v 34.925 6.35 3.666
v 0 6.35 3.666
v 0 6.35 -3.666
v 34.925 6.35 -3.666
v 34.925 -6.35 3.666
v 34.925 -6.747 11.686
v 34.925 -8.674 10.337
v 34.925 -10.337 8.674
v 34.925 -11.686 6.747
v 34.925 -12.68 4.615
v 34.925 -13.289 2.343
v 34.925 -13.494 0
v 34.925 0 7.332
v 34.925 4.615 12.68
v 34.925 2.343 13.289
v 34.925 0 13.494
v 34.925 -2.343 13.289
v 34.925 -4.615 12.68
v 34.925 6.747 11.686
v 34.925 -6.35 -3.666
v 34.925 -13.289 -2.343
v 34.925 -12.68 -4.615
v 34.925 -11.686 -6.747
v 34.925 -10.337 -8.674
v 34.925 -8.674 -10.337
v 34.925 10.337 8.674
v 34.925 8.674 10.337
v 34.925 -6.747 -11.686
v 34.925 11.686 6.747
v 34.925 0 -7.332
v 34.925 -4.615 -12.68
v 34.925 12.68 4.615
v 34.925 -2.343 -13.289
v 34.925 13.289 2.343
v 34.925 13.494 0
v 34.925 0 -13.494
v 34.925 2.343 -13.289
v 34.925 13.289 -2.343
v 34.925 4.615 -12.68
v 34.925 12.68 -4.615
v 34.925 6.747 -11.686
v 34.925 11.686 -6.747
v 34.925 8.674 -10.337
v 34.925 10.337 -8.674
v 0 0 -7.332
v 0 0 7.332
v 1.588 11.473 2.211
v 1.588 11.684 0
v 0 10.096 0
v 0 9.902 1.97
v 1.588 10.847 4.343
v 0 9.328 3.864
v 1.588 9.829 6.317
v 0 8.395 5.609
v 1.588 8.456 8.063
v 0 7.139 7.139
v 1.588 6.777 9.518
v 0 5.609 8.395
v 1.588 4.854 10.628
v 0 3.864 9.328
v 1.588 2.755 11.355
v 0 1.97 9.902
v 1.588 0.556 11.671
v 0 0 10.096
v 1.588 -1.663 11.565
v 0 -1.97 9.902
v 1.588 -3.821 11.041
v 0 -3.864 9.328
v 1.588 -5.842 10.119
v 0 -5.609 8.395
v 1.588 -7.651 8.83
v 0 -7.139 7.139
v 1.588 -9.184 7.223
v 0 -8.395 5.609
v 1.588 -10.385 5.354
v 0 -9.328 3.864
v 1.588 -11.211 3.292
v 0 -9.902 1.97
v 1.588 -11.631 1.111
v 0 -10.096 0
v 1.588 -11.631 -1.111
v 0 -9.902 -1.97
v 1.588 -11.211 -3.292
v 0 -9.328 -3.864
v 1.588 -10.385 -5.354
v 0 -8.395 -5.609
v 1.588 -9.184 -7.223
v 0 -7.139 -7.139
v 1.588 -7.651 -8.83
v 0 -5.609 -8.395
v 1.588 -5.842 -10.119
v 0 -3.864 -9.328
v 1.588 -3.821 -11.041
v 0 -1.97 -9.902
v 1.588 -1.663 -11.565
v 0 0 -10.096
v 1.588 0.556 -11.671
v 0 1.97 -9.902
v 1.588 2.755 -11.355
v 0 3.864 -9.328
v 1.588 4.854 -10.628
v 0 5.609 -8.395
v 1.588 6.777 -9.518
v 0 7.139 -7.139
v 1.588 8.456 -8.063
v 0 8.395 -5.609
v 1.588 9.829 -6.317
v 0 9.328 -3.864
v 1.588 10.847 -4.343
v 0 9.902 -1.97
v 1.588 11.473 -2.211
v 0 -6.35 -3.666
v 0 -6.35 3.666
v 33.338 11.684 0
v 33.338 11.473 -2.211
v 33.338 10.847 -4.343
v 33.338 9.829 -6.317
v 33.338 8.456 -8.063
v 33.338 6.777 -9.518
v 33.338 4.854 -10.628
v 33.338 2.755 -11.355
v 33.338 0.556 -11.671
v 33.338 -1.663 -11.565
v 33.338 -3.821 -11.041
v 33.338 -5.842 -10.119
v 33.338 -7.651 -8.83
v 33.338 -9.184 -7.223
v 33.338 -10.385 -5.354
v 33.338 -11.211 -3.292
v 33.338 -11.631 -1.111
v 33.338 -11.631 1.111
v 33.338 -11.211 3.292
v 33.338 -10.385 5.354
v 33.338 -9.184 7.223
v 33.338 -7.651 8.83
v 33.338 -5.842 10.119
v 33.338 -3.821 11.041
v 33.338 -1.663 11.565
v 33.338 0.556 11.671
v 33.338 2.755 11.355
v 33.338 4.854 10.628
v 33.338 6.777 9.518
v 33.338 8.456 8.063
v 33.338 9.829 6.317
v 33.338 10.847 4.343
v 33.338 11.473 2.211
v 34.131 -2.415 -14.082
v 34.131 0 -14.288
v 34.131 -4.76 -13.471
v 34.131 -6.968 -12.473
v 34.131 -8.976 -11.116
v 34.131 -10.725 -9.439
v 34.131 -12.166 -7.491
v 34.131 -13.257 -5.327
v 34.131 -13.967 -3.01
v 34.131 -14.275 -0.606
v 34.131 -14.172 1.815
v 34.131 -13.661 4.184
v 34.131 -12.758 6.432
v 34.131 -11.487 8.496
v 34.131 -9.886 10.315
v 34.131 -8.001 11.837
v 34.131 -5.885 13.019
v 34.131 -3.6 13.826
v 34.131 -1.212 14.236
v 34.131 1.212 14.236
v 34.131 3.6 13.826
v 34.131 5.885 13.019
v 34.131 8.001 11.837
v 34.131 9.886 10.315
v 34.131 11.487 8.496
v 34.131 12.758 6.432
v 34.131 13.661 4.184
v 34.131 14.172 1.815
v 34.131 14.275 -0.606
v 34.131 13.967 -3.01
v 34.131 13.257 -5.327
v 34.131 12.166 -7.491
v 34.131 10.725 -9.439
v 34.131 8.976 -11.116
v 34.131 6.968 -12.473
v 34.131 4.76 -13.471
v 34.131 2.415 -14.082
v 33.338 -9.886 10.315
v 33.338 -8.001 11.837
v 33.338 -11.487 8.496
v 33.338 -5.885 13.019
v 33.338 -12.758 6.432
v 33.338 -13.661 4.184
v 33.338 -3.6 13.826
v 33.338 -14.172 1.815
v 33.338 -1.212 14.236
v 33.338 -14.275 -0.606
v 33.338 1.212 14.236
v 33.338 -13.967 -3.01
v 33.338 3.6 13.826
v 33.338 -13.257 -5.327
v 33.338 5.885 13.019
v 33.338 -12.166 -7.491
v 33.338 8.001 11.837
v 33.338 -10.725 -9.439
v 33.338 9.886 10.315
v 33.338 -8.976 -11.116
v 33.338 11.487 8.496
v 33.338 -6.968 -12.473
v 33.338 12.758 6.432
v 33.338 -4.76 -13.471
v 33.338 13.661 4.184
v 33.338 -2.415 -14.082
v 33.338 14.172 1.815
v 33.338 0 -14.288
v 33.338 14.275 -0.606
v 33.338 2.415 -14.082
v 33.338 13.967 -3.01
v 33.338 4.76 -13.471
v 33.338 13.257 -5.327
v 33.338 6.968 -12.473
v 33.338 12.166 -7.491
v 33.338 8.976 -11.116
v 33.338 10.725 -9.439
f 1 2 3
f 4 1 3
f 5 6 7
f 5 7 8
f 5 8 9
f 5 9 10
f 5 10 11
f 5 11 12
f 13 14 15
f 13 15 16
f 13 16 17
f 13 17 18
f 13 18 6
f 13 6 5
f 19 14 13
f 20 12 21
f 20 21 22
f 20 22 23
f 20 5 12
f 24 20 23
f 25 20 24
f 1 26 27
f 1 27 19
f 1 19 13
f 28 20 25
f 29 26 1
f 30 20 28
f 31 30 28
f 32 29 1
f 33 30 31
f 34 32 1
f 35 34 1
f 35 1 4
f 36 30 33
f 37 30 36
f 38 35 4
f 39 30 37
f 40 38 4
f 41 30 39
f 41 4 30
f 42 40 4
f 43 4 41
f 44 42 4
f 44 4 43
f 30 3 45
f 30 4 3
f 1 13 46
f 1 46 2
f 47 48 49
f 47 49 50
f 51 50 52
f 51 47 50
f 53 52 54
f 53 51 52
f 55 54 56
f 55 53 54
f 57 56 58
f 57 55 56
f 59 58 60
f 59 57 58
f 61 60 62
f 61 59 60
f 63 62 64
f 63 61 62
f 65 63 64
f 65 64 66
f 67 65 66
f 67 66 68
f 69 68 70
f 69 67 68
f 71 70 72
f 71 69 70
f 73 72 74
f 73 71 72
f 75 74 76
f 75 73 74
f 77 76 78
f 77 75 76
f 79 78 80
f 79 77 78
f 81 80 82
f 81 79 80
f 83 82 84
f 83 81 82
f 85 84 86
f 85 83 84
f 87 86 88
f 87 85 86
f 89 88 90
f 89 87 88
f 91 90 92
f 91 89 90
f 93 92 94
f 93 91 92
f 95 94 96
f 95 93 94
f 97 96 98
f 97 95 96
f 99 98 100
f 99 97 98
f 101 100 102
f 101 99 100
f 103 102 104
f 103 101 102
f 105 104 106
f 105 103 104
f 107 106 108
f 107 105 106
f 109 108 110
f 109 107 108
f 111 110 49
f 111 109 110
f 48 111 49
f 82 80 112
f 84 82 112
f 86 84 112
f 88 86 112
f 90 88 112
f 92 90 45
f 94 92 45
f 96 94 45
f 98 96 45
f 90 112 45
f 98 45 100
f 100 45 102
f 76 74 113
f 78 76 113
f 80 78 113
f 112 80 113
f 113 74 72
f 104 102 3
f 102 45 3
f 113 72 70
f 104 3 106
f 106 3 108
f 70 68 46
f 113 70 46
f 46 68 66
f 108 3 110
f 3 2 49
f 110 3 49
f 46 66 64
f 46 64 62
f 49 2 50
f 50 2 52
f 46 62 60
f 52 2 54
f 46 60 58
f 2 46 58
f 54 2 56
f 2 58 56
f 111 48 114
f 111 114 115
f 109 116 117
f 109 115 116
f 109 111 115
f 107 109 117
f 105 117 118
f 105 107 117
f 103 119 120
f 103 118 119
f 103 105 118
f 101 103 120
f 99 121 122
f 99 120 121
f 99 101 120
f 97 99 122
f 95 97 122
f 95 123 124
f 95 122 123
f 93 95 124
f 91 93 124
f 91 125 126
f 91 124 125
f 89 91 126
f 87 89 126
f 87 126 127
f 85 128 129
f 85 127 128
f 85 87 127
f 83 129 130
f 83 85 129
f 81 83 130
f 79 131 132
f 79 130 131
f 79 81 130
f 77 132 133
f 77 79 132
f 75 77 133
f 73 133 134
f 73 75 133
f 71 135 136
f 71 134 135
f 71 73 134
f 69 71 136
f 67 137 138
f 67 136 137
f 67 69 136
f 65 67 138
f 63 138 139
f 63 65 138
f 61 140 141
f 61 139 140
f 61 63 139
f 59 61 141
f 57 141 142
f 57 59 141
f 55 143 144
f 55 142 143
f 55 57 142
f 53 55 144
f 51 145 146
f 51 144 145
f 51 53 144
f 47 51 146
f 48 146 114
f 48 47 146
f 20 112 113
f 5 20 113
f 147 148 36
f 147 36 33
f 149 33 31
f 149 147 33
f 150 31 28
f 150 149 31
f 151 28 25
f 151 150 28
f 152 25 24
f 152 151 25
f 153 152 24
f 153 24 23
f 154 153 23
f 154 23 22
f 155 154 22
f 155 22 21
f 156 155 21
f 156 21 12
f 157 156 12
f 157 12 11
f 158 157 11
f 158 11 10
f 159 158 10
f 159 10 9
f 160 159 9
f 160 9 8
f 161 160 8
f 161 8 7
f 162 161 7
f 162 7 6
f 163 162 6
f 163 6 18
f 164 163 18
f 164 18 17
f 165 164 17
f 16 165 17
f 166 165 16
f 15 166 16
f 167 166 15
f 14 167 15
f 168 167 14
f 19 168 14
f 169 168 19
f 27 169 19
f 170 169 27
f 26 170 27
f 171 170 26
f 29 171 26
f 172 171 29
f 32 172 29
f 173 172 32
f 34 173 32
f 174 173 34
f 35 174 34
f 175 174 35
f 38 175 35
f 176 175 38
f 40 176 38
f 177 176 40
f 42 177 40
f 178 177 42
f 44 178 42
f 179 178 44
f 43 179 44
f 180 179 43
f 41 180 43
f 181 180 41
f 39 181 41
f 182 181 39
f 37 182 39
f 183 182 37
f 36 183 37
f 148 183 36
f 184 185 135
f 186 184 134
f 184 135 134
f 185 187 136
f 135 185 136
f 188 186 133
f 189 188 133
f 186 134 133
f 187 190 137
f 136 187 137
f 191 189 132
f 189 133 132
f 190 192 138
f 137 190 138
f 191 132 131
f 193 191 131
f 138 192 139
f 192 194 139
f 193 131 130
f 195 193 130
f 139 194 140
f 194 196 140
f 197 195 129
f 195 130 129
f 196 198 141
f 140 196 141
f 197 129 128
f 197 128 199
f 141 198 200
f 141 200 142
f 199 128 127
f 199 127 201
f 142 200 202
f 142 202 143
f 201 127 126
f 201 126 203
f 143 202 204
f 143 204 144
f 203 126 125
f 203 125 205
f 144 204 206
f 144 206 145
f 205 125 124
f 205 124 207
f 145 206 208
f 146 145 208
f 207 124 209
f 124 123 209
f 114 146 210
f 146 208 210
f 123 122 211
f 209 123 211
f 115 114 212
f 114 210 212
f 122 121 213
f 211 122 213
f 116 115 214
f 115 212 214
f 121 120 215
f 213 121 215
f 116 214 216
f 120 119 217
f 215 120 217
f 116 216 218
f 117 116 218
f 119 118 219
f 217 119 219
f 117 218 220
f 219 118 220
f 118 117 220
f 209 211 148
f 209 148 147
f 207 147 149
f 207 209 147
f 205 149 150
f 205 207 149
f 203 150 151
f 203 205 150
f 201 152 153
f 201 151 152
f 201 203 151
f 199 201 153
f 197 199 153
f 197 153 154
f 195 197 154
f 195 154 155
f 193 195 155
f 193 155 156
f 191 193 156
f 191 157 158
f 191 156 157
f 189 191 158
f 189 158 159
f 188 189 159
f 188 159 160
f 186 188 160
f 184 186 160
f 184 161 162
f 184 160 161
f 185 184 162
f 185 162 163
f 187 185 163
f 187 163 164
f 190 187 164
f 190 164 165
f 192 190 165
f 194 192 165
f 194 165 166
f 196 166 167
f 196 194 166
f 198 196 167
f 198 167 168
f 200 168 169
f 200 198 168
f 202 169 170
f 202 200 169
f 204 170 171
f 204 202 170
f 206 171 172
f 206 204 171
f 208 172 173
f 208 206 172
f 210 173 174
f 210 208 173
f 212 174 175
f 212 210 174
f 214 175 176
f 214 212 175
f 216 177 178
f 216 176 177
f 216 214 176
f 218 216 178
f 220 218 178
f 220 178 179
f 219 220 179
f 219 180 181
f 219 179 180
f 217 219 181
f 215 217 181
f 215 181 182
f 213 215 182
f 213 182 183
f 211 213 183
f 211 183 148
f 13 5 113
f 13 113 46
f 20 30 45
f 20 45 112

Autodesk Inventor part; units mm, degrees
ref_plane "YZ Plane" through (0, 0, 0) normal (1, 0, 0) x (0, 1, 0)
ref_plane "XZ Plane" through (0, 0, 0) normal (0, 1, 0) x (-1, 0, 0)
ref_plane "XY Plane" through (0, 0, 0) normal (0, 0, 1) x (1, 0, 0)
sketch "Sketch1" plane through (0, 0, 0) normal (1, 0, 0) x (0, 1, 0)
  circle A0 centre (0, 0) radius 11.684
  dimension "d0" = 23.368
extrude "Extrusion1" add sketch "Sketch1" along normal blind 33.3375
sketch "Sketch2" plane through (33.3375, 0, 0) normal (1, 0, 0) x (0, 0, -1)
  circle A0 centre (0, 0) radius 11.684 projected
  circle A1 centre (0, 0) radius 14.2875
  dimension "d4" = 28.575
extrude "Extrusion2" add sketch "Sketch2" along normal blind 1.5875 contours A0 | A1
sketch "Sketch3" plane through (34.925, 0, 0) normal (1, 0, 0) x (0, 0, -1)
  circle A0 centre (0, 0) radius 14.2875 projected
  line L0 (3.6662, 6.35) -> (7.3323, 0)
  line L1 (7.3323, 0) -> (3.6662, -6.35)
  line L2 (3.6662, -6.35) -> (-3.6662, -6.35)
  line L3 (-3.6662, -6.35) -> (-7.3323, 0)
  line L4 (-7.3323, 0) -> (-3.6662, 6.35)
  line L5 (-3.6662, 6.35) -> (3.6662, 6.35)
  dimension "d11" = 12.7
extrude "Extrusion3" cut sketch "Sketch3" against normal blind 50.8 contours L0 L1 L2 L3 L4 L5
chamfer "Chamfer1" distance 0.7937 angle 45 1 edges at (34.925, 0, 14.2875)
chamfer "Chamfer2" distance 1.5875 angle 45 1 edges at (0, -11.684, 0)
properties part number "colson hub" material "Aluminum 6061"
